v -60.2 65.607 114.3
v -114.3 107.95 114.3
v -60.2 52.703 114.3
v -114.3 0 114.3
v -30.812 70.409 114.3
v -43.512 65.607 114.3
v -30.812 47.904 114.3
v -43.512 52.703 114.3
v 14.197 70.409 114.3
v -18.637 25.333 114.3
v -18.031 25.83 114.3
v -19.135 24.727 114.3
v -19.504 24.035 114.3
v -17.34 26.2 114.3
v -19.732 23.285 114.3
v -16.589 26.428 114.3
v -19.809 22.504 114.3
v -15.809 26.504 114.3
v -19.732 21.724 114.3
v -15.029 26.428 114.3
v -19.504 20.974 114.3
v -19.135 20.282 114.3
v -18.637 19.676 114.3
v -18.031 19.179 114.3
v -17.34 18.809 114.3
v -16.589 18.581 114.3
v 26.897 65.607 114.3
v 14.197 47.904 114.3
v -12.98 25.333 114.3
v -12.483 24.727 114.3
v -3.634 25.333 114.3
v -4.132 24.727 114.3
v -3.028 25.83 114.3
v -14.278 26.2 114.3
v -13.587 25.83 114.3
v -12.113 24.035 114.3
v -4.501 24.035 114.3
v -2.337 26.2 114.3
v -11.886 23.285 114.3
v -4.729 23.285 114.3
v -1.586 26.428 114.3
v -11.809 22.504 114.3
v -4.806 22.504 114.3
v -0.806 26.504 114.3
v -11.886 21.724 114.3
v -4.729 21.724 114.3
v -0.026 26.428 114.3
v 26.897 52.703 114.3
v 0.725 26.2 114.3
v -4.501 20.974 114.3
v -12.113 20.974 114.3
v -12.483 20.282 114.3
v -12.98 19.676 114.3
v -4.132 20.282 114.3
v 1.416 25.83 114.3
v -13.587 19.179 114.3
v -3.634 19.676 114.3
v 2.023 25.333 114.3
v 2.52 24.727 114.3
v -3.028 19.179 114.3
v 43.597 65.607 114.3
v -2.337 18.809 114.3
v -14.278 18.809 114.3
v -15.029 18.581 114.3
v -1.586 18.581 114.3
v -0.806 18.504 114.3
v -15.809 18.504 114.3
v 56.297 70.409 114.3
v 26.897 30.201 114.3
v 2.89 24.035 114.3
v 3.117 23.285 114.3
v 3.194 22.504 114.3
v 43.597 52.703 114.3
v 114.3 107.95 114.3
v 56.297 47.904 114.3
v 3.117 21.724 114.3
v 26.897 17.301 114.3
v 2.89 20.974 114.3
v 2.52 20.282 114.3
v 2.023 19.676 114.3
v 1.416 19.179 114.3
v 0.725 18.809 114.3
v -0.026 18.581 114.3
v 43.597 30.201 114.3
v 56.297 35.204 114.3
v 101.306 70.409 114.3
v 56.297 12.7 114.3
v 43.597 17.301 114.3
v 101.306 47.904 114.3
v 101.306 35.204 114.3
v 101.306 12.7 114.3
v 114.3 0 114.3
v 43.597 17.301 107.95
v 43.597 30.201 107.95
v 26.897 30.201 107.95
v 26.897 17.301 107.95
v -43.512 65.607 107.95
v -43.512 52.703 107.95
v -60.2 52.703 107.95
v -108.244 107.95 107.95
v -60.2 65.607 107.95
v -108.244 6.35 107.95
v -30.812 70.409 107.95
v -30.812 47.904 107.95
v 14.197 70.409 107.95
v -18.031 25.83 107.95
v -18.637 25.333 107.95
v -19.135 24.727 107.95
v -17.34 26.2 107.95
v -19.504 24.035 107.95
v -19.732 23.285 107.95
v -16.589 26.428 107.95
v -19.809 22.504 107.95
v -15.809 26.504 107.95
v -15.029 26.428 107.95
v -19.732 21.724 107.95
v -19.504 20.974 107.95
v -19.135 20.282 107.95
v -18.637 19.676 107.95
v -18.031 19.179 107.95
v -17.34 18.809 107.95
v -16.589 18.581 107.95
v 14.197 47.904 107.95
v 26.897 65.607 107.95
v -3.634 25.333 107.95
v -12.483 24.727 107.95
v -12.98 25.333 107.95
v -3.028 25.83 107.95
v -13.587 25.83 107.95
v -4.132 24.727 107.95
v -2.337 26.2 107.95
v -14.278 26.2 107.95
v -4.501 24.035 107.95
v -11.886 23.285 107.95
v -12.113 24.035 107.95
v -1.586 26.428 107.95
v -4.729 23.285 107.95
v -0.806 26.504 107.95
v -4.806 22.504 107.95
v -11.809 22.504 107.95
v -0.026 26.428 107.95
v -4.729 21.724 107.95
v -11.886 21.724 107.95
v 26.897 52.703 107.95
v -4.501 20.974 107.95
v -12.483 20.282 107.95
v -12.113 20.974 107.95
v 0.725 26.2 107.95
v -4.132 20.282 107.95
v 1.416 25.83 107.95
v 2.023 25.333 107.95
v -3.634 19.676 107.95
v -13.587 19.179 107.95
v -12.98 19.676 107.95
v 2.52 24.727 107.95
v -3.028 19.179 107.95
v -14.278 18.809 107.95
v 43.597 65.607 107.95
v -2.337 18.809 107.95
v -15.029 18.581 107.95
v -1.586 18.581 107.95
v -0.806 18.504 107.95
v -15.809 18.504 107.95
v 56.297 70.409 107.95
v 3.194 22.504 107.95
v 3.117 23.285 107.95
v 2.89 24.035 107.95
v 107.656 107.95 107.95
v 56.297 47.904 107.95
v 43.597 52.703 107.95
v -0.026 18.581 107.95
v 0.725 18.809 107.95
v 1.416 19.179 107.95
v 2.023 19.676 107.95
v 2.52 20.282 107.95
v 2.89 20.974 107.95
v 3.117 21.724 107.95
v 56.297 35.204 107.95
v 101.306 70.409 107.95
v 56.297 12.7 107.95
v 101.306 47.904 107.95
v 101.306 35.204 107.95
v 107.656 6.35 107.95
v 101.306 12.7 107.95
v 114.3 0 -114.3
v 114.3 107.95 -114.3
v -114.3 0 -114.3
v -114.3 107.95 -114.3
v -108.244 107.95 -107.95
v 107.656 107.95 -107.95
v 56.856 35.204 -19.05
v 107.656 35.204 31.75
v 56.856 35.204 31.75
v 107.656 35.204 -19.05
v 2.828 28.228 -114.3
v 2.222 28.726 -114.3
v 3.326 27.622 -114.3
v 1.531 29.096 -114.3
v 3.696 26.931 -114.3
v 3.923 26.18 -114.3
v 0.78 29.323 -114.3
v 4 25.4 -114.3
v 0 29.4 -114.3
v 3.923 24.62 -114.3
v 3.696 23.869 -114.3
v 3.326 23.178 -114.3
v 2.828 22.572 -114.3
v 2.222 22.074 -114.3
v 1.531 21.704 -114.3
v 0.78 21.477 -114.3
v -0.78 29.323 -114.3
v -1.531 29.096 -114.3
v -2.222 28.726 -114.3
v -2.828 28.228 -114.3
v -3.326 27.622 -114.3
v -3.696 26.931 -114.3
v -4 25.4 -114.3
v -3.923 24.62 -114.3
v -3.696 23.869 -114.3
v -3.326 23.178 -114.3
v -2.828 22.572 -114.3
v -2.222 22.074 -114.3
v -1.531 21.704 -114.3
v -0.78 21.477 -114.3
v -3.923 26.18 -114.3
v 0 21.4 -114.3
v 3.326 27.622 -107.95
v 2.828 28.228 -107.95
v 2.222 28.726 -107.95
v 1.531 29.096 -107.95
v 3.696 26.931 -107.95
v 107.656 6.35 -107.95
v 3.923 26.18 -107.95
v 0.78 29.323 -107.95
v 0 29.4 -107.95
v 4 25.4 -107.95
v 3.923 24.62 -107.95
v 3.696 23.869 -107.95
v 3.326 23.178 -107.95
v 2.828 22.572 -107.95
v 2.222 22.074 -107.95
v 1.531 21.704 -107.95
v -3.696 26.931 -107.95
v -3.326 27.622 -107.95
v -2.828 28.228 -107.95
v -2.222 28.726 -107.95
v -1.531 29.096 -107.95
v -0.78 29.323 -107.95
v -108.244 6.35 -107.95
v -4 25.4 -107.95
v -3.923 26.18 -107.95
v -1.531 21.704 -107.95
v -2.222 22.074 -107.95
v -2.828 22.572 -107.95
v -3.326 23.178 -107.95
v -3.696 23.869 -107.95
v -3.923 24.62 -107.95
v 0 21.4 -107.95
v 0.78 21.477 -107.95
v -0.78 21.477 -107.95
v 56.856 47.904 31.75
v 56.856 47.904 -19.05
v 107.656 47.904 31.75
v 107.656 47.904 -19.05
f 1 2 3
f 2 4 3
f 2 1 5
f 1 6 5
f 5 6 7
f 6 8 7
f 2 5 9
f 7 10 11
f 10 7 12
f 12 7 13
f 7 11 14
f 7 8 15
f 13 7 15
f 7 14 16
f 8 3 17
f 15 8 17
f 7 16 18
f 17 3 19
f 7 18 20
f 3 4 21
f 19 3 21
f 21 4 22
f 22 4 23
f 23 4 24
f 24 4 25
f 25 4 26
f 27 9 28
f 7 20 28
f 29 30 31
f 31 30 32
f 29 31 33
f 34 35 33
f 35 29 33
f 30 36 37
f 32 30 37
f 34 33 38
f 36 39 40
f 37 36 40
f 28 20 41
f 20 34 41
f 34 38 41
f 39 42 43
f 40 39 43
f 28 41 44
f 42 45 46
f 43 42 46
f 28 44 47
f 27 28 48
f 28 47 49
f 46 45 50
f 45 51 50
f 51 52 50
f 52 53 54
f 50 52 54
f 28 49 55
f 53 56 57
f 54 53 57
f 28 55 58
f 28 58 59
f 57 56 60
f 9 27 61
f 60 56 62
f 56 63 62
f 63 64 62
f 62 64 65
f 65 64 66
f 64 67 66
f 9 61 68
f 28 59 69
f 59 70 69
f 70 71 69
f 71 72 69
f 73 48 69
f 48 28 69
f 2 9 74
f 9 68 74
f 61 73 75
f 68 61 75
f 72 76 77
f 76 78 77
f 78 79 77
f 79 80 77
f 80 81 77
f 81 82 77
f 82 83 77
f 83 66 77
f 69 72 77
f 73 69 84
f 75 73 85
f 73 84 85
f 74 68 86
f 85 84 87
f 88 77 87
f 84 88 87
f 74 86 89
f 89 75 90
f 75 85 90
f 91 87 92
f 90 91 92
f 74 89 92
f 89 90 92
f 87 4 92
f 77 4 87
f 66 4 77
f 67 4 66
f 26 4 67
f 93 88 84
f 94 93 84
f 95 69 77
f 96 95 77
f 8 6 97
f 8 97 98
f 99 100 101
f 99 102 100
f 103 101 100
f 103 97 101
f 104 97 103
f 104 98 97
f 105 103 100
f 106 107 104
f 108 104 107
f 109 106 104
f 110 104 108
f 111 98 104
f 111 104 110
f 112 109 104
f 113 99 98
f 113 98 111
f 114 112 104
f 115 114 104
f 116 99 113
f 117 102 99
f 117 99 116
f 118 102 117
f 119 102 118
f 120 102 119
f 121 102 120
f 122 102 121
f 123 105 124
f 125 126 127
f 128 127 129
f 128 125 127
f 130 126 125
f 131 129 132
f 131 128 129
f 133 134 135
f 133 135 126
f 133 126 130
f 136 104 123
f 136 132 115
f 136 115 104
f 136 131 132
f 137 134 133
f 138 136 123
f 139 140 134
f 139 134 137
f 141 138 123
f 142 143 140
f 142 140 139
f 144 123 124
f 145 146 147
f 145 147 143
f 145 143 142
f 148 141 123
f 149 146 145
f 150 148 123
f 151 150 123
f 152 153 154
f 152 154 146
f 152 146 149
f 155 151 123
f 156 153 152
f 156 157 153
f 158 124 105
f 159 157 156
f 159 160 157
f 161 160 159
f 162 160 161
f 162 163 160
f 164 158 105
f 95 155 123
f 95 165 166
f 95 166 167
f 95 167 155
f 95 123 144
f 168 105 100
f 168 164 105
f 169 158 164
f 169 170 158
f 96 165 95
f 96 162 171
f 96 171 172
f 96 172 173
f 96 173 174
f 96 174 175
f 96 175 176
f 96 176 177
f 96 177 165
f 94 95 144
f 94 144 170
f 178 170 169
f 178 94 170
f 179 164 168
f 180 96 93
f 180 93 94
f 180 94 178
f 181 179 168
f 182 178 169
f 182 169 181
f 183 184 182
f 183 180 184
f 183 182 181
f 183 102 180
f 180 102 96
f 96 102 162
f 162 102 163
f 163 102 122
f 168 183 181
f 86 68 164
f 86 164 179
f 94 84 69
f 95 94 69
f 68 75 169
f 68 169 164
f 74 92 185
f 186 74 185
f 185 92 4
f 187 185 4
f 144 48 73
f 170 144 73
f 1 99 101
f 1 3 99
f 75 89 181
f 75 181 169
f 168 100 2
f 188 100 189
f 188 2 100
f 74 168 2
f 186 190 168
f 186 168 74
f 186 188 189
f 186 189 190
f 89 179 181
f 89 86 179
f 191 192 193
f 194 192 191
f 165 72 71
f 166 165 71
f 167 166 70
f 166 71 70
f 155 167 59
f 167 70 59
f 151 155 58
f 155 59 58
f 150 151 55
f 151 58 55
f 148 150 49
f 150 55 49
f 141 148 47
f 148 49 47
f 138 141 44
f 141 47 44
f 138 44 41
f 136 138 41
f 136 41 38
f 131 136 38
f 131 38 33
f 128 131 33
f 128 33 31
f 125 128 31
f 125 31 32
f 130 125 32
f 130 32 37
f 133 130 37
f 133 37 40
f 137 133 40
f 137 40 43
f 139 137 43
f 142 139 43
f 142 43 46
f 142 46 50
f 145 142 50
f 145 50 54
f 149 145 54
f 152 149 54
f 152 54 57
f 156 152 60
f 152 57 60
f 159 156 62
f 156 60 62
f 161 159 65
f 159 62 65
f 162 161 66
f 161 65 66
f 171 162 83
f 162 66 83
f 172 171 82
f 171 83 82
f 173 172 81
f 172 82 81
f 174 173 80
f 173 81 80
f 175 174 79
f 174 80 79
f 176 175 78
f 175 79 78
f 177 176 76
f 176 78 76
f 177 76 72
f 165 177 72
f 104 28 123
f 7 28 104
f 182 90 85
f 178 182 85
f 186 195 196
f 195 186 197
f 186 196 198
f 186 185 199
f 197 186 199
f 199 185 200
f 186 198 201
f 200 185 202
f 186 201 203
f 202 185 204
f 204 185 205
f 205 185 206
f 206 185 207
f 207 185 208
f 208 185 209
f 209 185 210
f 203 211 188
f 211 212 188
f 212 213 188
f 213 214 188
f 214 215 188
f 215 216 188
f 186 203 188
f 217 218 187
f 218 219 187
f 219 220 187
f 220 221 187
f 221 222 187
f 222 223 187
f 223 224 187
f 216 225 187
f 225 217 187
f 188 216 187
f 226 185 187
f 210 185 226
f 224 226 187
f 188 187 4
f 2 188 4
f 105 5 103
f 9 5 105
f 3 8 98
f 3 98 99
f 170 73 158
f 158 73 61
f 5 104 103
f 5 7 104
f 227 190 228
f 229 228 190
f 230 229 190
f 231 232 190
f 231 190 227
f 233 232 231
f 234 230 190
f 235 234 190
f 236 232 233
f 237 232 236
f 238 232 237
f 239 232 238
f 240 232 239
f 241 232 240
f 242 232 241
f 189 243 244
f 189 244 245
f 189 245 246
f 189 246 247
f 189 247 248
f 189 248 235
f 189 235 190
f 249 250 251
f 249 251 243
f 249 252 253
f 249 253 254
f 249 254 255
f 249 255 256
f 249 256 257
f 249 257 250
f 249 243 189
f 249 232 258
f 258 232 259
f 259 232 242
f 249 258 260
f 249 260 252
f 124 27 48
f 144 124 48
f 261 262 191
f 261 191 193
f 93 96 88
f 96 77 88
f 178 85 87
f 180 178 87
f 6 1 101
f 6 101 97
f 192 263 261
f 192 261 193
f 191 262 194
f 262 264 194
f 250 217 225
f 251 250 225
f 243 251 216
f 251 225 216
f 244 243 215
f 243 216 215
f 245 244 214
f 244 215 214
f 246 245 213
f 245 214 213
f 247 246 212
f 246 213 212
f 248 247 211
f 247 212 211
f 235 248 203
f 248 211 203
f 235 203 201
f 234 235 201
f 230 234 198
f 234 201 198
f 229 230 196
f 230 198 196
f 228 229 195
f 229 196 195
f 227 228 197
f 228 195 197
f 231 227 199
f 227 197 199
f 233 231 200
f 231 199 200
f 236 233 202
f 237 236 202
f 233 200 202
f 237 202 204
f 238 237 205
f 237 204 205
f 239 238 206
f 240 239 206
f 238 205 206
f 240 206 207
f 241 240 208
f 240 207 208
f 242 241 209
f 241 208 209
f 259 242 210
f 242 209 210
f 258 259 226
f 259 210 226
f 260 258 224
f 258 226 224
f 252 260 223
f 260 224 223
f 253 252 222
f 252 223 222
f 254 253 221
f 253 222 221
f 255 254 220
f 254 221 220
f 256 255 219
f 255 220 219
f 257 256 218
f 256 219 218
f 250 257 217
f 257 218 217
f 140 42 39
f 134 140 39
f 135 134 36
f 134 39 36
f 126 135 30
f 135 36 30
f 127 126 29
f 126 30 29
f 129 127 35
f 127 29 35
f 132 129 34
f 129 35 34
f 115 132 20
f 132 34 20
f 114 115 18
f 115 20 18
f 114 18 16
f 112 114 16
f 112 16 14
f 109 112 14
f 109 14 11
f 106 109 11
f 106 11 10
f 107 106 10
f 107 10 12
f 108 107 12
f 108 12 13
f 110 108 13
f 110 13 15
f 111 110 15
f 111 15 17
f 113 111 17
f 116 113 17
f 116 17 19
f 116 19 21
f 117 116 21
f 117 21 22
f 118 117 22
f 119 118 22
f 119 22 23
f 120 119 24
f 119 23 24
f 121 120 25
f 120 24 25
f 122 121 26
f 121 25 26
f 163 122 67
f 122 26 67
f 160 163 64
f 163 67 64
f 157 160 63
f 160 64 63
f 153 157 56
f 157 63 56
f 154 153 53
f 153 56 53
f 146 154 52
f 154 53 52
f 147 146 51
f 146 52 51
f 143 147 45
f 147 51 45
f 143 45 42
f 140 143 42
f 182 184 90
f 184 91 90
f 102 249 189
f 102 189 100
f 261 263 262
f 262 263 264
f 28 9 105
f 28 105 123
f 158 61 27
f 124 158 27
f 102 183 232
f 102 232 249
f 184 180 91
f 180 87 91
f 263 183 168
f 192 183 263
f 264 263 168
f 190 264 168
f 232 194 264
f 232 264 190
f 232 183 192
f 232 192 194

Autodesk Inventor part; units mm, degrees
ref_plane "YZ Plane" through (0, 0, 0) normal (1, 0, 0) x (0, 1, 0)
ref_plane "XZ Plane" through (0, 0, 0) normal (0, 1, 0) x (-1, 0, 0)
ref_plane "XY Plane" through (0, 0, 0) normal (0, 0, 1) x (1, 0, 0)
sketch "Sketch1" plane through (0, 0, 0) normal (0, 1, 0) x (-1, 0, 0)
  line L0 (0, 0) -> (-114.3, 0)
  line L1 (-114.3, 0) -> (-114.3, -114.3)
  line L2 (-114.3, -114.3) -> (114.3, -114.3)
  line L3 (114.3, -114.3) -> (114.3, 114.3)
  line L4 (114.3, 114.3) -> (-114.3, 114.3)
  line L5 (-114.3, 114.3) -> (-114.3, 0)
  dimension "d0" = 114.3
  dimension "d1" = 114.3
  dimension "d2" = 228.6
  dimension "d3" = 228.6
  dimension "d4" = 90
extrude "Extrusion1" add sketch "Sketch1" along normal blind 6.35
sketch "Sketch3" plane through (0, 6.35, 0) normal (0, 1, 0) x (1, 0, 0)
  line L0 (114.3, 114.3) -> (-114.3, 114.3) projected
  line L1 (-114.3, 114.3) -> (-108.2442, 114.3)
  line L2 (-108.2442, 114.3) -> (-108.2442, -114.3)
  line L3 (-108.2442, 114.3) -> (120.3558, 114.3) construction
  line L4 (-108.2442, -114.3) -> (-108.2442, -107.95)
  line L5 (-108.2442, -107.95) -> (107.6558, -107.95)
  line L6 (107.6558, -107.95) -> (107.6558, 107.95)
  line L7 (107.6558, 107.95) -> (-108.2442, 107.95)
  line L8 (-114.3, 114.3) -> (-114.3, -114.3) projected
  line L9 (-114.3, -114.3) -> (114.3, -114.3) projected
  line L10 (114.3, -114.3) -> (114.3, 114.3) projected
  point P0 (0, 0)
  dimension "d19" = 228.6
  dimension "d20" = 90
  dimension "d21" = 6.35
  dimension "d22" = 215.9
  dimension "d23" = 215.9
extrude "Extrusion3" add sketch "Sketch3" along normal blind 101.6 contours L10 L9 L2 L5 L6 L7 L0 | L2 L9 L8 L0
sketch "Sketch4" plane through (-114.3, 0, 114.3) normal (0, 0, 1) x (1, 0, 0)
  line L0 (221.9558, 6.35) -> (221.9558, 107.95) projected
  line L1 (221.9558, 107.95) -> (221.9558, 44.45)
  line L2 (221.9558, 6.35) -> (6.0558, 6.35) projected
  line L3 (221.9558, 6.35) -> (221.9558, 12.7)
  line L4 (221.9558, 6.35) -> (221.9558, 107.95) projected
  line L5 (221.9558, 12.7) -> (215.6058, 12.7)
  line L6 (215.6058, 12.7) -> (215.6058, 35.2044)
  line L7 (215.6058, 35.2044) -> (170.597, 35.2044)
  line L8 (170.597, 35.2044) -> (170.597, 12.7)
  line L9 (170.597, 12.7) -> (215.6058, 12.7)
  line L10 (170.597, 12.7) -> (157.897, 12.7)
  line L11 (157.897, 12.7) -> (157.897, 35.2044)
  line L12 (157.897, 35.2044) -> (112.8882, 35.2044)
  line L13 (112.8882, 35.2044) -> (112.8882, 12.7)
  line L14 (112.8882, 12.7) -> (157.897, 12.7)
  line L15 (112.8882, 35.2044) -> (100.1882, 35.2044)
  line L16 (100.1882, 35.2044) -> (100.1882, 12.7)
  line L17 (100.1882, 12.7) -> (55.1794, 12.7)
  line L18 (55.1794, 12.7) -> (55.1794, 35.2044)
  line L19 (55.1794, 35.2044) -> (100.1882, 35.2044)
  line L20 (215.6058, 35.2044) -> (215.6058, 47.9044)
  line L21 (215.6058, 47.9044) -> (170.597, 47.9044)
  line L22 (170.597, 47.9044) -> (170.597, 70.4088)
  line L23 (170.597, 70.4088) -> (215.6058, 70.4088)
  line L24 (215.6058, 70.4088) -> (215.6058, 47.9044)
  line L25 (215.6058, 70.4088) -> (215.6058, 83.1088)
  point P0 (114.3, 0)
  point P1 (215.6058, 105.6132)
  point P2 (170.597, 105.6132)
  point P3 (170.597, 83.1088)
  dimension "d34" = 6.35
  dimension "d35" = 6.35
  dimension "d36" = 22.5044
  dimension "d37" = 45.0088
  dimension "d38" = 12.7
  dimension "d39" = 45.0088
  dimension "d40" = 12.7
  dimension "d41" = 45.0088
  dimension "d44" = 12.7
  dimension "d45" = 22.5044
  dimension "d46" = 12.7
  dimension "d47" = 22.5044
sketch "Sketch9" plane through (-114.3, 0, 114.3) normal (0, 0, 1) x (1, 0, 0)
  line L0 (170.597, 47.9044) -> (170.597, 70.4088) projected
  line L1 (170.597, 70.4088) -> (170.597, 59.1566)
  line L2 (170.597, 59.1566) -> (157.897, 59.1566)
  line L3 (170.597, 35.0034) -> (170.597, 23.7512)
  line L4 (170.597, 23.7512) -> (157.897, 23.7512)
  line L5 (157.897, 59.1566) -> (157.897, 65.6066)
  line L6 (157.897, 65.6066) -> (141.197, 65.6066)
  line L7 (141.197, 65.6066) -> (141.197, 52.7034)
  line L8 (141.197, 52.7034) -> (157.897, 52.7034)
  line L9 (157.897, 52.7034) -> (157.897, 59.1566)
  line L10 (157.897, 23.7512) -> (157.897, 30.2012)
  line L11 (157.897, 30.2012) -> (141.197, 30.2012)
  line L12 (141.197, 30.2012) -> (141.197, 17.3012)
  line L13 (141.197, 17.3012) -> (157.897, 17.3012)
  line L14 (157.897, 17.3012) -> (157.897, 23.7512)
  point P0 (114.3, 0)
  point P1 (170.597, 105.6132)
  dimension "d64" = 11.2522
  dimension "d65" = 12.7
  dimension "d67" = 11.2522
  dimension "d68" = 12.7
  dimension "d82" = 6.45
  dimension "d83" = 12.9032
  dimension "d84" = 6.45
  dimension "d85" = 12.9
extrude "Extrusion4" cut sketch "Sketch4" against normal blind 114.3 contours L9 L8 L7 L6 | L21 L22 L23 L24
extrude "Extrusion6" cut sketch "Sketch9" against normal blind 114.3
sketch "Sketch14" plane through (-108.2442, 6.35, 107.95) normal (1, 0, 0) x (0, 0, -1)
  line L0 (215.9, 0) -> (0, 0) projected
  line L1 (0, 0) -> (0, 101.6) projected
  line L2 (-6.35, 101.6) -> (0, 101.6)
  line L3 (0, 101.6) -> (215.9, 101.6) projected
  line L4 (215.9, 0) -> (215.9, 101.6) projected
  line L5 (215.9, 66.675) -> (215.9, 9.525)
  line L6 (215.9, 66.675) -> (203.2, 66.675)
  line L7 (203.2, 66.675) -> (203.2, 9.525)
  line L8 (203.2, 9.525) -> (158.75, 9.525)
  line L9 (158.75, 9.525) -> (158.75, 66.675)
  line L10 (158.75, 66.675) -> (203.2, 66.675)
  line L11 (158.75, 66.675) -> (146.05, 66.675)
  line L12 (146.05, 66.675) -> (146.05, 9.525)
  line L13 (146.05, 9.525) -> (101.6, 9.525)
  line L14 (101.6, 9.525) -> (101.6, 66.675)
  line L15 (101.6, 66.675) -> (146.05, 66.675)
  line L16 (101.6, 66.675) -> (88.9, 66.675)
  line L17 (88.9, 66.675) -> (88.9, 9.525)
  line L18 (88.9, 9.525) -> (44.45, 9.525)
  line L19 (44.45, 9.525) -> (44.45, 66.675)
  line L20 (44.45, 66.675) -> (88.9, 66.675)
  line L21 (203.2, 66.675) -> (180.975, 66.675)
  line L22 (180.975, 66.675) -> (180.975, 61.675)
  line L23 (180.975, 9.525) -> (180.975, 14.525)
  circle A0 centre (180.975, 61.675) radius 2.54
  circle A1 centre (180.975, 14.525) radius 2.54
  line L24 (123.825, 66.675) -> (123.825, 61.675)
  line L25 (123.825, 9.525) -> (123.825, 14.525)
  circle A2 centre (123.825, 61.675) radius 2.54
  circle A3 centre (123.825, 14.525) radius 2.54
  line L26 (66.675, 66.675) -> (66.675, 61.675)
  line L27 (66.675, 9.525) -> (66.675, 14.525)
  circle A4 centre (66.675, 61.675) radius 2.54
  circle A5 centre (66.675, 14.525) radius 2.54
  point P0 (107.95, -6.35)
  dimension "d123" = 57.15
  dimension "d124" = 12.7
  dimension "d125" = 44.45
  dimension "d126" = 12.7
  dimension "d127" = 44.45
  dimension "d128" = 12.7
  dimension "d129" = 44.45
  dimension "d139" = 22.225
  dimension "d140" = 5
  dimension "d141" = 5
  dimension "d142" = 5.08
  dimension "d143" = 5.08
  dimension "d144" = 5
  dimension "d145" = 5
  dimension "d146" = 5.08
  dimension "d147" = 5.08
  dimension "d148" = 5
  dimension "d149" = 5
  dimension "d150" = 5.08
  dimension "d151" = 5.08
sketch "Sketch15" plane through (-114.3, 0, 114.3) normal (0, 0, 1) x (1, 0, 0)
  line L0 (141.197, 65.6066) -> (141.197, 52.7034) projected
  line L1 (141.197, 59.155) -> (128.497, 59.155)
  line L2 (128.497, 59.155) -> (128.497, 70.4088)
  line L3 (128.497, 70.4088) -> (128.497, 47.9044)
  line L4 (215.6058, 47.9044) -> (170.597, 47.9044) projected
  line L5 (128.497, 47.9044) -> (83.4882, 47.9044)
  line L6 (83.4882, 47.9044) -> (83.4882, 70.4088)
  line L7 (83.4882, 70.4088) -> (128.497, 70.4088)
  line L8 (83.4882, 59.1566) -> (70.7882, 59.1566)
  line L9 (70.7882, 59.1566) -> (70.7882, 65.6066)
  line L10 (70.7882, 65.6066) -> (70.7882, 52.7034)
  line L11 (70.7882, 52.7034) -> (70.7882, 59.1566)
  line L12 (70.7882, 52.7034) -> (54.1004, 52.7034)
  line L13 (54.1004, 52.7034) -> (54.1004, 65.6066)
  line L14 (54.1004, 65.6066) -> (70.7882, 65.6066)
  point P0 (114.3, 0)
  dimension "d115" = 12.7
  dimension "d116" = 45.0088
  dimension "d117" = 12.7
  dimension "d118" = 16.6878
extrude "Extrusion9" cut sketch "Sketch15" against normal blind 114.3
sketch "Sketch16" plane through (-114.3, 0, 114.3) normal (0, 0, 1) x (1, 0, 0)
  line L0 (83.4882, 70.4088) -> (83.4882, 47.9044) projected
  line L1 (83.4882, 47.9044) -> (98.4911, 47.9044)
  line L2 (98.4911, 47.9044) -> (113.4941, 47.9044)
  line L3 (128.497, 47.9044) -> (83.4882, 47.9044) projected
  line L4 (113.4941, 47.9044) -> (128.497, 47.9044)
  line L5 (98.4911, 47.9044) -> (98.4911, 22.5044)
  line L6 (113.4941, 47.9044) -> (113.4941, 22.5044)
  circle A0 centre (98.4911, 22.5044) radius 4
  circle A1 centre (113.4941, 22.5044) radius 4
  point P0 (114.3, 0)
  dimension "d130" = 15.0029
  dimension "d131" = 15.0029
  dimension "d132" = 15.0029
  dimension "d133" = 25.4
  dimension "d134" = 25.4
  dimension "d135" = 8
  dimension "d136" = 8
extrude "Extrusion10" cut sketch "Sketch16" against normal blind 76.2
sketch "Sketch17" plane through (0, 6.35, 0) normal (0, 1, 0) x (1, 0, 0)
  line L0 (107.6558, -107.95) -> (94.9558, -107.95)
  line L1 (107.6558, 107.95) -> (107.6558, -107.95) projected
  line L2 (107.6558, -107.95) -> (120.3558, -107.95) construction
  line L3 (94.9558, -6.35) -> (94.9558, 19.05)
  line L4 (94.9558, 19.05) -> (94.9558, 44.45)
  line L5 (94.9558, 44.45) -> (94.9558, 69.85)
  line L6 (94.9558, 69.85) -> (94.9558, 95.25)
  circle A0 centre (94.9558, -6.35) radius 2.54
  circle A1 centre (94.9558, 19.05) radius 2.54
  circle A2 centre (94.9558, 44.45) radius 2.54
  circle A3 centre (94.9558, 69.85) radius 2.54
  line L7 (-108.2442, -107.95) -> (-82.8442, -107.95)
  line L8 (107.6558, -107.95) -> (-108.2442, -107.95) projected
  line L9 (-82.8442, -107.95) -> (-82.8442, -95.25)
  line L10 (-82.8442, -95.25) -> (-82.8442, -82.55)
  line L11 (-82.8442, -82.55) -> (-82.8442, -69.85)
  circle A4 centre (-82.8442, -95.25) radius 2.54
  circle A5 centre (-82.8442, -82.55) radius 2.54
  circle A6 centre (-82.8442, -69.85) radius 2.54
  point P0 (0, 0)
  dimension "d152" = 12.7
  dimension "d153" = 180
  dimension "d159" = 25.4
  dimension "d161" = 25.4
  dimension "d162" = 25.4
  dimension "d163" = 25.4
  dimension "d164" = 5.08
  dimension "d165" = 5.08
  dimension "d166" = 5.08
  dimension "d167" = 5.08
  dimension "d173" = 25.4
  dimension "d174" = 12.7
  dimension "d175" = 12.7
  dimension "d176" = 12.7
  dimension "d177" = 5.08
  dimension "d178" = 5.08
  dimension "d179" = 5.08
sketch "Sketch18" plane through (0, 6.35, 0) normal (0, 1, 0) x (1, 0, 0)
  line L0 (-8.3074, -72.1776) -> (-8.3074, -114.3)
  line L1 (14.197, -114.3) -> (-30.8118, -114.3) projected
  line L2 (-8.3074, -114.3) -> (-8.3074, 38.1)
  line L3 (-8.3074, 38.1) -> (-33.7074, 38.1)
  line L4 (-33.7074, 38.1) -> (17.0926, 38.1)
  circle A0 centre (-33.7074, 38.1) radius 2.54
  circle A1 centre (-8.3074, 38.1) radius 2.54
  circle A2 centre (17.0926, 38.1) radius 2.54
  point P0 (0, 0)
  dimension "d180" = 152.4
  dimension "d181" = 25.4
  dimension "d182" = 50.8
  dimension "d183" = 5.08
  dimension "d184" = 5.08
  dimension "d185" = 5.08
sketch "Sketch19" plane through (107.6558, 6.35, -107.95) normal (-1, 0, 0) x (0, 0, 1)
  line L0 (215.9, 41.5544) -> (88.9, 41.5544)
  line L1 (88.9, 41.5544) -> (139.7, 41.5544)
  line L2 (215.9, 28.8544) -> (88.9, 28.8544)
  line L3 (88.9, 28.8544) -> (139.7, 28.8544)
  line L4 (139.7, 41.5544) -> (139.7, 28.8544)
  line L5 (88.9, 41.5544) -> (88.9, 28.8544)
  point P0 (107.95, -6.35)
  dimension "d186" = 127
  dimension "d187" = 50.8
  dimension "d188" = 127
extrude "Extrusion11" add sketch "Sketch19" along normal blind 50.8
sketch "Sketch21" plane through (114.3, 0, -114.3) normal (0, 0, -1) x (-1, 0, 0)
  line L0 (114.3, 0) -> (114.3, 25.4)
  arc A0 (114.3, 25.4) -> (46.4215, 144.8435) centre (-24.7297, 25.4) ccw
  circle A1 centre (114.3, 25.4) radius 2.54
  circle A2 centre (114.3, 25.4) radius 4
  dimension "d195" = 25.4
  dimension "d196" = 5.08
  dimension "d197" = 8
extrude "Extrusion13" cut sketch "Sketch21" against normal blind 50.8
properties part number "box thin walled"
